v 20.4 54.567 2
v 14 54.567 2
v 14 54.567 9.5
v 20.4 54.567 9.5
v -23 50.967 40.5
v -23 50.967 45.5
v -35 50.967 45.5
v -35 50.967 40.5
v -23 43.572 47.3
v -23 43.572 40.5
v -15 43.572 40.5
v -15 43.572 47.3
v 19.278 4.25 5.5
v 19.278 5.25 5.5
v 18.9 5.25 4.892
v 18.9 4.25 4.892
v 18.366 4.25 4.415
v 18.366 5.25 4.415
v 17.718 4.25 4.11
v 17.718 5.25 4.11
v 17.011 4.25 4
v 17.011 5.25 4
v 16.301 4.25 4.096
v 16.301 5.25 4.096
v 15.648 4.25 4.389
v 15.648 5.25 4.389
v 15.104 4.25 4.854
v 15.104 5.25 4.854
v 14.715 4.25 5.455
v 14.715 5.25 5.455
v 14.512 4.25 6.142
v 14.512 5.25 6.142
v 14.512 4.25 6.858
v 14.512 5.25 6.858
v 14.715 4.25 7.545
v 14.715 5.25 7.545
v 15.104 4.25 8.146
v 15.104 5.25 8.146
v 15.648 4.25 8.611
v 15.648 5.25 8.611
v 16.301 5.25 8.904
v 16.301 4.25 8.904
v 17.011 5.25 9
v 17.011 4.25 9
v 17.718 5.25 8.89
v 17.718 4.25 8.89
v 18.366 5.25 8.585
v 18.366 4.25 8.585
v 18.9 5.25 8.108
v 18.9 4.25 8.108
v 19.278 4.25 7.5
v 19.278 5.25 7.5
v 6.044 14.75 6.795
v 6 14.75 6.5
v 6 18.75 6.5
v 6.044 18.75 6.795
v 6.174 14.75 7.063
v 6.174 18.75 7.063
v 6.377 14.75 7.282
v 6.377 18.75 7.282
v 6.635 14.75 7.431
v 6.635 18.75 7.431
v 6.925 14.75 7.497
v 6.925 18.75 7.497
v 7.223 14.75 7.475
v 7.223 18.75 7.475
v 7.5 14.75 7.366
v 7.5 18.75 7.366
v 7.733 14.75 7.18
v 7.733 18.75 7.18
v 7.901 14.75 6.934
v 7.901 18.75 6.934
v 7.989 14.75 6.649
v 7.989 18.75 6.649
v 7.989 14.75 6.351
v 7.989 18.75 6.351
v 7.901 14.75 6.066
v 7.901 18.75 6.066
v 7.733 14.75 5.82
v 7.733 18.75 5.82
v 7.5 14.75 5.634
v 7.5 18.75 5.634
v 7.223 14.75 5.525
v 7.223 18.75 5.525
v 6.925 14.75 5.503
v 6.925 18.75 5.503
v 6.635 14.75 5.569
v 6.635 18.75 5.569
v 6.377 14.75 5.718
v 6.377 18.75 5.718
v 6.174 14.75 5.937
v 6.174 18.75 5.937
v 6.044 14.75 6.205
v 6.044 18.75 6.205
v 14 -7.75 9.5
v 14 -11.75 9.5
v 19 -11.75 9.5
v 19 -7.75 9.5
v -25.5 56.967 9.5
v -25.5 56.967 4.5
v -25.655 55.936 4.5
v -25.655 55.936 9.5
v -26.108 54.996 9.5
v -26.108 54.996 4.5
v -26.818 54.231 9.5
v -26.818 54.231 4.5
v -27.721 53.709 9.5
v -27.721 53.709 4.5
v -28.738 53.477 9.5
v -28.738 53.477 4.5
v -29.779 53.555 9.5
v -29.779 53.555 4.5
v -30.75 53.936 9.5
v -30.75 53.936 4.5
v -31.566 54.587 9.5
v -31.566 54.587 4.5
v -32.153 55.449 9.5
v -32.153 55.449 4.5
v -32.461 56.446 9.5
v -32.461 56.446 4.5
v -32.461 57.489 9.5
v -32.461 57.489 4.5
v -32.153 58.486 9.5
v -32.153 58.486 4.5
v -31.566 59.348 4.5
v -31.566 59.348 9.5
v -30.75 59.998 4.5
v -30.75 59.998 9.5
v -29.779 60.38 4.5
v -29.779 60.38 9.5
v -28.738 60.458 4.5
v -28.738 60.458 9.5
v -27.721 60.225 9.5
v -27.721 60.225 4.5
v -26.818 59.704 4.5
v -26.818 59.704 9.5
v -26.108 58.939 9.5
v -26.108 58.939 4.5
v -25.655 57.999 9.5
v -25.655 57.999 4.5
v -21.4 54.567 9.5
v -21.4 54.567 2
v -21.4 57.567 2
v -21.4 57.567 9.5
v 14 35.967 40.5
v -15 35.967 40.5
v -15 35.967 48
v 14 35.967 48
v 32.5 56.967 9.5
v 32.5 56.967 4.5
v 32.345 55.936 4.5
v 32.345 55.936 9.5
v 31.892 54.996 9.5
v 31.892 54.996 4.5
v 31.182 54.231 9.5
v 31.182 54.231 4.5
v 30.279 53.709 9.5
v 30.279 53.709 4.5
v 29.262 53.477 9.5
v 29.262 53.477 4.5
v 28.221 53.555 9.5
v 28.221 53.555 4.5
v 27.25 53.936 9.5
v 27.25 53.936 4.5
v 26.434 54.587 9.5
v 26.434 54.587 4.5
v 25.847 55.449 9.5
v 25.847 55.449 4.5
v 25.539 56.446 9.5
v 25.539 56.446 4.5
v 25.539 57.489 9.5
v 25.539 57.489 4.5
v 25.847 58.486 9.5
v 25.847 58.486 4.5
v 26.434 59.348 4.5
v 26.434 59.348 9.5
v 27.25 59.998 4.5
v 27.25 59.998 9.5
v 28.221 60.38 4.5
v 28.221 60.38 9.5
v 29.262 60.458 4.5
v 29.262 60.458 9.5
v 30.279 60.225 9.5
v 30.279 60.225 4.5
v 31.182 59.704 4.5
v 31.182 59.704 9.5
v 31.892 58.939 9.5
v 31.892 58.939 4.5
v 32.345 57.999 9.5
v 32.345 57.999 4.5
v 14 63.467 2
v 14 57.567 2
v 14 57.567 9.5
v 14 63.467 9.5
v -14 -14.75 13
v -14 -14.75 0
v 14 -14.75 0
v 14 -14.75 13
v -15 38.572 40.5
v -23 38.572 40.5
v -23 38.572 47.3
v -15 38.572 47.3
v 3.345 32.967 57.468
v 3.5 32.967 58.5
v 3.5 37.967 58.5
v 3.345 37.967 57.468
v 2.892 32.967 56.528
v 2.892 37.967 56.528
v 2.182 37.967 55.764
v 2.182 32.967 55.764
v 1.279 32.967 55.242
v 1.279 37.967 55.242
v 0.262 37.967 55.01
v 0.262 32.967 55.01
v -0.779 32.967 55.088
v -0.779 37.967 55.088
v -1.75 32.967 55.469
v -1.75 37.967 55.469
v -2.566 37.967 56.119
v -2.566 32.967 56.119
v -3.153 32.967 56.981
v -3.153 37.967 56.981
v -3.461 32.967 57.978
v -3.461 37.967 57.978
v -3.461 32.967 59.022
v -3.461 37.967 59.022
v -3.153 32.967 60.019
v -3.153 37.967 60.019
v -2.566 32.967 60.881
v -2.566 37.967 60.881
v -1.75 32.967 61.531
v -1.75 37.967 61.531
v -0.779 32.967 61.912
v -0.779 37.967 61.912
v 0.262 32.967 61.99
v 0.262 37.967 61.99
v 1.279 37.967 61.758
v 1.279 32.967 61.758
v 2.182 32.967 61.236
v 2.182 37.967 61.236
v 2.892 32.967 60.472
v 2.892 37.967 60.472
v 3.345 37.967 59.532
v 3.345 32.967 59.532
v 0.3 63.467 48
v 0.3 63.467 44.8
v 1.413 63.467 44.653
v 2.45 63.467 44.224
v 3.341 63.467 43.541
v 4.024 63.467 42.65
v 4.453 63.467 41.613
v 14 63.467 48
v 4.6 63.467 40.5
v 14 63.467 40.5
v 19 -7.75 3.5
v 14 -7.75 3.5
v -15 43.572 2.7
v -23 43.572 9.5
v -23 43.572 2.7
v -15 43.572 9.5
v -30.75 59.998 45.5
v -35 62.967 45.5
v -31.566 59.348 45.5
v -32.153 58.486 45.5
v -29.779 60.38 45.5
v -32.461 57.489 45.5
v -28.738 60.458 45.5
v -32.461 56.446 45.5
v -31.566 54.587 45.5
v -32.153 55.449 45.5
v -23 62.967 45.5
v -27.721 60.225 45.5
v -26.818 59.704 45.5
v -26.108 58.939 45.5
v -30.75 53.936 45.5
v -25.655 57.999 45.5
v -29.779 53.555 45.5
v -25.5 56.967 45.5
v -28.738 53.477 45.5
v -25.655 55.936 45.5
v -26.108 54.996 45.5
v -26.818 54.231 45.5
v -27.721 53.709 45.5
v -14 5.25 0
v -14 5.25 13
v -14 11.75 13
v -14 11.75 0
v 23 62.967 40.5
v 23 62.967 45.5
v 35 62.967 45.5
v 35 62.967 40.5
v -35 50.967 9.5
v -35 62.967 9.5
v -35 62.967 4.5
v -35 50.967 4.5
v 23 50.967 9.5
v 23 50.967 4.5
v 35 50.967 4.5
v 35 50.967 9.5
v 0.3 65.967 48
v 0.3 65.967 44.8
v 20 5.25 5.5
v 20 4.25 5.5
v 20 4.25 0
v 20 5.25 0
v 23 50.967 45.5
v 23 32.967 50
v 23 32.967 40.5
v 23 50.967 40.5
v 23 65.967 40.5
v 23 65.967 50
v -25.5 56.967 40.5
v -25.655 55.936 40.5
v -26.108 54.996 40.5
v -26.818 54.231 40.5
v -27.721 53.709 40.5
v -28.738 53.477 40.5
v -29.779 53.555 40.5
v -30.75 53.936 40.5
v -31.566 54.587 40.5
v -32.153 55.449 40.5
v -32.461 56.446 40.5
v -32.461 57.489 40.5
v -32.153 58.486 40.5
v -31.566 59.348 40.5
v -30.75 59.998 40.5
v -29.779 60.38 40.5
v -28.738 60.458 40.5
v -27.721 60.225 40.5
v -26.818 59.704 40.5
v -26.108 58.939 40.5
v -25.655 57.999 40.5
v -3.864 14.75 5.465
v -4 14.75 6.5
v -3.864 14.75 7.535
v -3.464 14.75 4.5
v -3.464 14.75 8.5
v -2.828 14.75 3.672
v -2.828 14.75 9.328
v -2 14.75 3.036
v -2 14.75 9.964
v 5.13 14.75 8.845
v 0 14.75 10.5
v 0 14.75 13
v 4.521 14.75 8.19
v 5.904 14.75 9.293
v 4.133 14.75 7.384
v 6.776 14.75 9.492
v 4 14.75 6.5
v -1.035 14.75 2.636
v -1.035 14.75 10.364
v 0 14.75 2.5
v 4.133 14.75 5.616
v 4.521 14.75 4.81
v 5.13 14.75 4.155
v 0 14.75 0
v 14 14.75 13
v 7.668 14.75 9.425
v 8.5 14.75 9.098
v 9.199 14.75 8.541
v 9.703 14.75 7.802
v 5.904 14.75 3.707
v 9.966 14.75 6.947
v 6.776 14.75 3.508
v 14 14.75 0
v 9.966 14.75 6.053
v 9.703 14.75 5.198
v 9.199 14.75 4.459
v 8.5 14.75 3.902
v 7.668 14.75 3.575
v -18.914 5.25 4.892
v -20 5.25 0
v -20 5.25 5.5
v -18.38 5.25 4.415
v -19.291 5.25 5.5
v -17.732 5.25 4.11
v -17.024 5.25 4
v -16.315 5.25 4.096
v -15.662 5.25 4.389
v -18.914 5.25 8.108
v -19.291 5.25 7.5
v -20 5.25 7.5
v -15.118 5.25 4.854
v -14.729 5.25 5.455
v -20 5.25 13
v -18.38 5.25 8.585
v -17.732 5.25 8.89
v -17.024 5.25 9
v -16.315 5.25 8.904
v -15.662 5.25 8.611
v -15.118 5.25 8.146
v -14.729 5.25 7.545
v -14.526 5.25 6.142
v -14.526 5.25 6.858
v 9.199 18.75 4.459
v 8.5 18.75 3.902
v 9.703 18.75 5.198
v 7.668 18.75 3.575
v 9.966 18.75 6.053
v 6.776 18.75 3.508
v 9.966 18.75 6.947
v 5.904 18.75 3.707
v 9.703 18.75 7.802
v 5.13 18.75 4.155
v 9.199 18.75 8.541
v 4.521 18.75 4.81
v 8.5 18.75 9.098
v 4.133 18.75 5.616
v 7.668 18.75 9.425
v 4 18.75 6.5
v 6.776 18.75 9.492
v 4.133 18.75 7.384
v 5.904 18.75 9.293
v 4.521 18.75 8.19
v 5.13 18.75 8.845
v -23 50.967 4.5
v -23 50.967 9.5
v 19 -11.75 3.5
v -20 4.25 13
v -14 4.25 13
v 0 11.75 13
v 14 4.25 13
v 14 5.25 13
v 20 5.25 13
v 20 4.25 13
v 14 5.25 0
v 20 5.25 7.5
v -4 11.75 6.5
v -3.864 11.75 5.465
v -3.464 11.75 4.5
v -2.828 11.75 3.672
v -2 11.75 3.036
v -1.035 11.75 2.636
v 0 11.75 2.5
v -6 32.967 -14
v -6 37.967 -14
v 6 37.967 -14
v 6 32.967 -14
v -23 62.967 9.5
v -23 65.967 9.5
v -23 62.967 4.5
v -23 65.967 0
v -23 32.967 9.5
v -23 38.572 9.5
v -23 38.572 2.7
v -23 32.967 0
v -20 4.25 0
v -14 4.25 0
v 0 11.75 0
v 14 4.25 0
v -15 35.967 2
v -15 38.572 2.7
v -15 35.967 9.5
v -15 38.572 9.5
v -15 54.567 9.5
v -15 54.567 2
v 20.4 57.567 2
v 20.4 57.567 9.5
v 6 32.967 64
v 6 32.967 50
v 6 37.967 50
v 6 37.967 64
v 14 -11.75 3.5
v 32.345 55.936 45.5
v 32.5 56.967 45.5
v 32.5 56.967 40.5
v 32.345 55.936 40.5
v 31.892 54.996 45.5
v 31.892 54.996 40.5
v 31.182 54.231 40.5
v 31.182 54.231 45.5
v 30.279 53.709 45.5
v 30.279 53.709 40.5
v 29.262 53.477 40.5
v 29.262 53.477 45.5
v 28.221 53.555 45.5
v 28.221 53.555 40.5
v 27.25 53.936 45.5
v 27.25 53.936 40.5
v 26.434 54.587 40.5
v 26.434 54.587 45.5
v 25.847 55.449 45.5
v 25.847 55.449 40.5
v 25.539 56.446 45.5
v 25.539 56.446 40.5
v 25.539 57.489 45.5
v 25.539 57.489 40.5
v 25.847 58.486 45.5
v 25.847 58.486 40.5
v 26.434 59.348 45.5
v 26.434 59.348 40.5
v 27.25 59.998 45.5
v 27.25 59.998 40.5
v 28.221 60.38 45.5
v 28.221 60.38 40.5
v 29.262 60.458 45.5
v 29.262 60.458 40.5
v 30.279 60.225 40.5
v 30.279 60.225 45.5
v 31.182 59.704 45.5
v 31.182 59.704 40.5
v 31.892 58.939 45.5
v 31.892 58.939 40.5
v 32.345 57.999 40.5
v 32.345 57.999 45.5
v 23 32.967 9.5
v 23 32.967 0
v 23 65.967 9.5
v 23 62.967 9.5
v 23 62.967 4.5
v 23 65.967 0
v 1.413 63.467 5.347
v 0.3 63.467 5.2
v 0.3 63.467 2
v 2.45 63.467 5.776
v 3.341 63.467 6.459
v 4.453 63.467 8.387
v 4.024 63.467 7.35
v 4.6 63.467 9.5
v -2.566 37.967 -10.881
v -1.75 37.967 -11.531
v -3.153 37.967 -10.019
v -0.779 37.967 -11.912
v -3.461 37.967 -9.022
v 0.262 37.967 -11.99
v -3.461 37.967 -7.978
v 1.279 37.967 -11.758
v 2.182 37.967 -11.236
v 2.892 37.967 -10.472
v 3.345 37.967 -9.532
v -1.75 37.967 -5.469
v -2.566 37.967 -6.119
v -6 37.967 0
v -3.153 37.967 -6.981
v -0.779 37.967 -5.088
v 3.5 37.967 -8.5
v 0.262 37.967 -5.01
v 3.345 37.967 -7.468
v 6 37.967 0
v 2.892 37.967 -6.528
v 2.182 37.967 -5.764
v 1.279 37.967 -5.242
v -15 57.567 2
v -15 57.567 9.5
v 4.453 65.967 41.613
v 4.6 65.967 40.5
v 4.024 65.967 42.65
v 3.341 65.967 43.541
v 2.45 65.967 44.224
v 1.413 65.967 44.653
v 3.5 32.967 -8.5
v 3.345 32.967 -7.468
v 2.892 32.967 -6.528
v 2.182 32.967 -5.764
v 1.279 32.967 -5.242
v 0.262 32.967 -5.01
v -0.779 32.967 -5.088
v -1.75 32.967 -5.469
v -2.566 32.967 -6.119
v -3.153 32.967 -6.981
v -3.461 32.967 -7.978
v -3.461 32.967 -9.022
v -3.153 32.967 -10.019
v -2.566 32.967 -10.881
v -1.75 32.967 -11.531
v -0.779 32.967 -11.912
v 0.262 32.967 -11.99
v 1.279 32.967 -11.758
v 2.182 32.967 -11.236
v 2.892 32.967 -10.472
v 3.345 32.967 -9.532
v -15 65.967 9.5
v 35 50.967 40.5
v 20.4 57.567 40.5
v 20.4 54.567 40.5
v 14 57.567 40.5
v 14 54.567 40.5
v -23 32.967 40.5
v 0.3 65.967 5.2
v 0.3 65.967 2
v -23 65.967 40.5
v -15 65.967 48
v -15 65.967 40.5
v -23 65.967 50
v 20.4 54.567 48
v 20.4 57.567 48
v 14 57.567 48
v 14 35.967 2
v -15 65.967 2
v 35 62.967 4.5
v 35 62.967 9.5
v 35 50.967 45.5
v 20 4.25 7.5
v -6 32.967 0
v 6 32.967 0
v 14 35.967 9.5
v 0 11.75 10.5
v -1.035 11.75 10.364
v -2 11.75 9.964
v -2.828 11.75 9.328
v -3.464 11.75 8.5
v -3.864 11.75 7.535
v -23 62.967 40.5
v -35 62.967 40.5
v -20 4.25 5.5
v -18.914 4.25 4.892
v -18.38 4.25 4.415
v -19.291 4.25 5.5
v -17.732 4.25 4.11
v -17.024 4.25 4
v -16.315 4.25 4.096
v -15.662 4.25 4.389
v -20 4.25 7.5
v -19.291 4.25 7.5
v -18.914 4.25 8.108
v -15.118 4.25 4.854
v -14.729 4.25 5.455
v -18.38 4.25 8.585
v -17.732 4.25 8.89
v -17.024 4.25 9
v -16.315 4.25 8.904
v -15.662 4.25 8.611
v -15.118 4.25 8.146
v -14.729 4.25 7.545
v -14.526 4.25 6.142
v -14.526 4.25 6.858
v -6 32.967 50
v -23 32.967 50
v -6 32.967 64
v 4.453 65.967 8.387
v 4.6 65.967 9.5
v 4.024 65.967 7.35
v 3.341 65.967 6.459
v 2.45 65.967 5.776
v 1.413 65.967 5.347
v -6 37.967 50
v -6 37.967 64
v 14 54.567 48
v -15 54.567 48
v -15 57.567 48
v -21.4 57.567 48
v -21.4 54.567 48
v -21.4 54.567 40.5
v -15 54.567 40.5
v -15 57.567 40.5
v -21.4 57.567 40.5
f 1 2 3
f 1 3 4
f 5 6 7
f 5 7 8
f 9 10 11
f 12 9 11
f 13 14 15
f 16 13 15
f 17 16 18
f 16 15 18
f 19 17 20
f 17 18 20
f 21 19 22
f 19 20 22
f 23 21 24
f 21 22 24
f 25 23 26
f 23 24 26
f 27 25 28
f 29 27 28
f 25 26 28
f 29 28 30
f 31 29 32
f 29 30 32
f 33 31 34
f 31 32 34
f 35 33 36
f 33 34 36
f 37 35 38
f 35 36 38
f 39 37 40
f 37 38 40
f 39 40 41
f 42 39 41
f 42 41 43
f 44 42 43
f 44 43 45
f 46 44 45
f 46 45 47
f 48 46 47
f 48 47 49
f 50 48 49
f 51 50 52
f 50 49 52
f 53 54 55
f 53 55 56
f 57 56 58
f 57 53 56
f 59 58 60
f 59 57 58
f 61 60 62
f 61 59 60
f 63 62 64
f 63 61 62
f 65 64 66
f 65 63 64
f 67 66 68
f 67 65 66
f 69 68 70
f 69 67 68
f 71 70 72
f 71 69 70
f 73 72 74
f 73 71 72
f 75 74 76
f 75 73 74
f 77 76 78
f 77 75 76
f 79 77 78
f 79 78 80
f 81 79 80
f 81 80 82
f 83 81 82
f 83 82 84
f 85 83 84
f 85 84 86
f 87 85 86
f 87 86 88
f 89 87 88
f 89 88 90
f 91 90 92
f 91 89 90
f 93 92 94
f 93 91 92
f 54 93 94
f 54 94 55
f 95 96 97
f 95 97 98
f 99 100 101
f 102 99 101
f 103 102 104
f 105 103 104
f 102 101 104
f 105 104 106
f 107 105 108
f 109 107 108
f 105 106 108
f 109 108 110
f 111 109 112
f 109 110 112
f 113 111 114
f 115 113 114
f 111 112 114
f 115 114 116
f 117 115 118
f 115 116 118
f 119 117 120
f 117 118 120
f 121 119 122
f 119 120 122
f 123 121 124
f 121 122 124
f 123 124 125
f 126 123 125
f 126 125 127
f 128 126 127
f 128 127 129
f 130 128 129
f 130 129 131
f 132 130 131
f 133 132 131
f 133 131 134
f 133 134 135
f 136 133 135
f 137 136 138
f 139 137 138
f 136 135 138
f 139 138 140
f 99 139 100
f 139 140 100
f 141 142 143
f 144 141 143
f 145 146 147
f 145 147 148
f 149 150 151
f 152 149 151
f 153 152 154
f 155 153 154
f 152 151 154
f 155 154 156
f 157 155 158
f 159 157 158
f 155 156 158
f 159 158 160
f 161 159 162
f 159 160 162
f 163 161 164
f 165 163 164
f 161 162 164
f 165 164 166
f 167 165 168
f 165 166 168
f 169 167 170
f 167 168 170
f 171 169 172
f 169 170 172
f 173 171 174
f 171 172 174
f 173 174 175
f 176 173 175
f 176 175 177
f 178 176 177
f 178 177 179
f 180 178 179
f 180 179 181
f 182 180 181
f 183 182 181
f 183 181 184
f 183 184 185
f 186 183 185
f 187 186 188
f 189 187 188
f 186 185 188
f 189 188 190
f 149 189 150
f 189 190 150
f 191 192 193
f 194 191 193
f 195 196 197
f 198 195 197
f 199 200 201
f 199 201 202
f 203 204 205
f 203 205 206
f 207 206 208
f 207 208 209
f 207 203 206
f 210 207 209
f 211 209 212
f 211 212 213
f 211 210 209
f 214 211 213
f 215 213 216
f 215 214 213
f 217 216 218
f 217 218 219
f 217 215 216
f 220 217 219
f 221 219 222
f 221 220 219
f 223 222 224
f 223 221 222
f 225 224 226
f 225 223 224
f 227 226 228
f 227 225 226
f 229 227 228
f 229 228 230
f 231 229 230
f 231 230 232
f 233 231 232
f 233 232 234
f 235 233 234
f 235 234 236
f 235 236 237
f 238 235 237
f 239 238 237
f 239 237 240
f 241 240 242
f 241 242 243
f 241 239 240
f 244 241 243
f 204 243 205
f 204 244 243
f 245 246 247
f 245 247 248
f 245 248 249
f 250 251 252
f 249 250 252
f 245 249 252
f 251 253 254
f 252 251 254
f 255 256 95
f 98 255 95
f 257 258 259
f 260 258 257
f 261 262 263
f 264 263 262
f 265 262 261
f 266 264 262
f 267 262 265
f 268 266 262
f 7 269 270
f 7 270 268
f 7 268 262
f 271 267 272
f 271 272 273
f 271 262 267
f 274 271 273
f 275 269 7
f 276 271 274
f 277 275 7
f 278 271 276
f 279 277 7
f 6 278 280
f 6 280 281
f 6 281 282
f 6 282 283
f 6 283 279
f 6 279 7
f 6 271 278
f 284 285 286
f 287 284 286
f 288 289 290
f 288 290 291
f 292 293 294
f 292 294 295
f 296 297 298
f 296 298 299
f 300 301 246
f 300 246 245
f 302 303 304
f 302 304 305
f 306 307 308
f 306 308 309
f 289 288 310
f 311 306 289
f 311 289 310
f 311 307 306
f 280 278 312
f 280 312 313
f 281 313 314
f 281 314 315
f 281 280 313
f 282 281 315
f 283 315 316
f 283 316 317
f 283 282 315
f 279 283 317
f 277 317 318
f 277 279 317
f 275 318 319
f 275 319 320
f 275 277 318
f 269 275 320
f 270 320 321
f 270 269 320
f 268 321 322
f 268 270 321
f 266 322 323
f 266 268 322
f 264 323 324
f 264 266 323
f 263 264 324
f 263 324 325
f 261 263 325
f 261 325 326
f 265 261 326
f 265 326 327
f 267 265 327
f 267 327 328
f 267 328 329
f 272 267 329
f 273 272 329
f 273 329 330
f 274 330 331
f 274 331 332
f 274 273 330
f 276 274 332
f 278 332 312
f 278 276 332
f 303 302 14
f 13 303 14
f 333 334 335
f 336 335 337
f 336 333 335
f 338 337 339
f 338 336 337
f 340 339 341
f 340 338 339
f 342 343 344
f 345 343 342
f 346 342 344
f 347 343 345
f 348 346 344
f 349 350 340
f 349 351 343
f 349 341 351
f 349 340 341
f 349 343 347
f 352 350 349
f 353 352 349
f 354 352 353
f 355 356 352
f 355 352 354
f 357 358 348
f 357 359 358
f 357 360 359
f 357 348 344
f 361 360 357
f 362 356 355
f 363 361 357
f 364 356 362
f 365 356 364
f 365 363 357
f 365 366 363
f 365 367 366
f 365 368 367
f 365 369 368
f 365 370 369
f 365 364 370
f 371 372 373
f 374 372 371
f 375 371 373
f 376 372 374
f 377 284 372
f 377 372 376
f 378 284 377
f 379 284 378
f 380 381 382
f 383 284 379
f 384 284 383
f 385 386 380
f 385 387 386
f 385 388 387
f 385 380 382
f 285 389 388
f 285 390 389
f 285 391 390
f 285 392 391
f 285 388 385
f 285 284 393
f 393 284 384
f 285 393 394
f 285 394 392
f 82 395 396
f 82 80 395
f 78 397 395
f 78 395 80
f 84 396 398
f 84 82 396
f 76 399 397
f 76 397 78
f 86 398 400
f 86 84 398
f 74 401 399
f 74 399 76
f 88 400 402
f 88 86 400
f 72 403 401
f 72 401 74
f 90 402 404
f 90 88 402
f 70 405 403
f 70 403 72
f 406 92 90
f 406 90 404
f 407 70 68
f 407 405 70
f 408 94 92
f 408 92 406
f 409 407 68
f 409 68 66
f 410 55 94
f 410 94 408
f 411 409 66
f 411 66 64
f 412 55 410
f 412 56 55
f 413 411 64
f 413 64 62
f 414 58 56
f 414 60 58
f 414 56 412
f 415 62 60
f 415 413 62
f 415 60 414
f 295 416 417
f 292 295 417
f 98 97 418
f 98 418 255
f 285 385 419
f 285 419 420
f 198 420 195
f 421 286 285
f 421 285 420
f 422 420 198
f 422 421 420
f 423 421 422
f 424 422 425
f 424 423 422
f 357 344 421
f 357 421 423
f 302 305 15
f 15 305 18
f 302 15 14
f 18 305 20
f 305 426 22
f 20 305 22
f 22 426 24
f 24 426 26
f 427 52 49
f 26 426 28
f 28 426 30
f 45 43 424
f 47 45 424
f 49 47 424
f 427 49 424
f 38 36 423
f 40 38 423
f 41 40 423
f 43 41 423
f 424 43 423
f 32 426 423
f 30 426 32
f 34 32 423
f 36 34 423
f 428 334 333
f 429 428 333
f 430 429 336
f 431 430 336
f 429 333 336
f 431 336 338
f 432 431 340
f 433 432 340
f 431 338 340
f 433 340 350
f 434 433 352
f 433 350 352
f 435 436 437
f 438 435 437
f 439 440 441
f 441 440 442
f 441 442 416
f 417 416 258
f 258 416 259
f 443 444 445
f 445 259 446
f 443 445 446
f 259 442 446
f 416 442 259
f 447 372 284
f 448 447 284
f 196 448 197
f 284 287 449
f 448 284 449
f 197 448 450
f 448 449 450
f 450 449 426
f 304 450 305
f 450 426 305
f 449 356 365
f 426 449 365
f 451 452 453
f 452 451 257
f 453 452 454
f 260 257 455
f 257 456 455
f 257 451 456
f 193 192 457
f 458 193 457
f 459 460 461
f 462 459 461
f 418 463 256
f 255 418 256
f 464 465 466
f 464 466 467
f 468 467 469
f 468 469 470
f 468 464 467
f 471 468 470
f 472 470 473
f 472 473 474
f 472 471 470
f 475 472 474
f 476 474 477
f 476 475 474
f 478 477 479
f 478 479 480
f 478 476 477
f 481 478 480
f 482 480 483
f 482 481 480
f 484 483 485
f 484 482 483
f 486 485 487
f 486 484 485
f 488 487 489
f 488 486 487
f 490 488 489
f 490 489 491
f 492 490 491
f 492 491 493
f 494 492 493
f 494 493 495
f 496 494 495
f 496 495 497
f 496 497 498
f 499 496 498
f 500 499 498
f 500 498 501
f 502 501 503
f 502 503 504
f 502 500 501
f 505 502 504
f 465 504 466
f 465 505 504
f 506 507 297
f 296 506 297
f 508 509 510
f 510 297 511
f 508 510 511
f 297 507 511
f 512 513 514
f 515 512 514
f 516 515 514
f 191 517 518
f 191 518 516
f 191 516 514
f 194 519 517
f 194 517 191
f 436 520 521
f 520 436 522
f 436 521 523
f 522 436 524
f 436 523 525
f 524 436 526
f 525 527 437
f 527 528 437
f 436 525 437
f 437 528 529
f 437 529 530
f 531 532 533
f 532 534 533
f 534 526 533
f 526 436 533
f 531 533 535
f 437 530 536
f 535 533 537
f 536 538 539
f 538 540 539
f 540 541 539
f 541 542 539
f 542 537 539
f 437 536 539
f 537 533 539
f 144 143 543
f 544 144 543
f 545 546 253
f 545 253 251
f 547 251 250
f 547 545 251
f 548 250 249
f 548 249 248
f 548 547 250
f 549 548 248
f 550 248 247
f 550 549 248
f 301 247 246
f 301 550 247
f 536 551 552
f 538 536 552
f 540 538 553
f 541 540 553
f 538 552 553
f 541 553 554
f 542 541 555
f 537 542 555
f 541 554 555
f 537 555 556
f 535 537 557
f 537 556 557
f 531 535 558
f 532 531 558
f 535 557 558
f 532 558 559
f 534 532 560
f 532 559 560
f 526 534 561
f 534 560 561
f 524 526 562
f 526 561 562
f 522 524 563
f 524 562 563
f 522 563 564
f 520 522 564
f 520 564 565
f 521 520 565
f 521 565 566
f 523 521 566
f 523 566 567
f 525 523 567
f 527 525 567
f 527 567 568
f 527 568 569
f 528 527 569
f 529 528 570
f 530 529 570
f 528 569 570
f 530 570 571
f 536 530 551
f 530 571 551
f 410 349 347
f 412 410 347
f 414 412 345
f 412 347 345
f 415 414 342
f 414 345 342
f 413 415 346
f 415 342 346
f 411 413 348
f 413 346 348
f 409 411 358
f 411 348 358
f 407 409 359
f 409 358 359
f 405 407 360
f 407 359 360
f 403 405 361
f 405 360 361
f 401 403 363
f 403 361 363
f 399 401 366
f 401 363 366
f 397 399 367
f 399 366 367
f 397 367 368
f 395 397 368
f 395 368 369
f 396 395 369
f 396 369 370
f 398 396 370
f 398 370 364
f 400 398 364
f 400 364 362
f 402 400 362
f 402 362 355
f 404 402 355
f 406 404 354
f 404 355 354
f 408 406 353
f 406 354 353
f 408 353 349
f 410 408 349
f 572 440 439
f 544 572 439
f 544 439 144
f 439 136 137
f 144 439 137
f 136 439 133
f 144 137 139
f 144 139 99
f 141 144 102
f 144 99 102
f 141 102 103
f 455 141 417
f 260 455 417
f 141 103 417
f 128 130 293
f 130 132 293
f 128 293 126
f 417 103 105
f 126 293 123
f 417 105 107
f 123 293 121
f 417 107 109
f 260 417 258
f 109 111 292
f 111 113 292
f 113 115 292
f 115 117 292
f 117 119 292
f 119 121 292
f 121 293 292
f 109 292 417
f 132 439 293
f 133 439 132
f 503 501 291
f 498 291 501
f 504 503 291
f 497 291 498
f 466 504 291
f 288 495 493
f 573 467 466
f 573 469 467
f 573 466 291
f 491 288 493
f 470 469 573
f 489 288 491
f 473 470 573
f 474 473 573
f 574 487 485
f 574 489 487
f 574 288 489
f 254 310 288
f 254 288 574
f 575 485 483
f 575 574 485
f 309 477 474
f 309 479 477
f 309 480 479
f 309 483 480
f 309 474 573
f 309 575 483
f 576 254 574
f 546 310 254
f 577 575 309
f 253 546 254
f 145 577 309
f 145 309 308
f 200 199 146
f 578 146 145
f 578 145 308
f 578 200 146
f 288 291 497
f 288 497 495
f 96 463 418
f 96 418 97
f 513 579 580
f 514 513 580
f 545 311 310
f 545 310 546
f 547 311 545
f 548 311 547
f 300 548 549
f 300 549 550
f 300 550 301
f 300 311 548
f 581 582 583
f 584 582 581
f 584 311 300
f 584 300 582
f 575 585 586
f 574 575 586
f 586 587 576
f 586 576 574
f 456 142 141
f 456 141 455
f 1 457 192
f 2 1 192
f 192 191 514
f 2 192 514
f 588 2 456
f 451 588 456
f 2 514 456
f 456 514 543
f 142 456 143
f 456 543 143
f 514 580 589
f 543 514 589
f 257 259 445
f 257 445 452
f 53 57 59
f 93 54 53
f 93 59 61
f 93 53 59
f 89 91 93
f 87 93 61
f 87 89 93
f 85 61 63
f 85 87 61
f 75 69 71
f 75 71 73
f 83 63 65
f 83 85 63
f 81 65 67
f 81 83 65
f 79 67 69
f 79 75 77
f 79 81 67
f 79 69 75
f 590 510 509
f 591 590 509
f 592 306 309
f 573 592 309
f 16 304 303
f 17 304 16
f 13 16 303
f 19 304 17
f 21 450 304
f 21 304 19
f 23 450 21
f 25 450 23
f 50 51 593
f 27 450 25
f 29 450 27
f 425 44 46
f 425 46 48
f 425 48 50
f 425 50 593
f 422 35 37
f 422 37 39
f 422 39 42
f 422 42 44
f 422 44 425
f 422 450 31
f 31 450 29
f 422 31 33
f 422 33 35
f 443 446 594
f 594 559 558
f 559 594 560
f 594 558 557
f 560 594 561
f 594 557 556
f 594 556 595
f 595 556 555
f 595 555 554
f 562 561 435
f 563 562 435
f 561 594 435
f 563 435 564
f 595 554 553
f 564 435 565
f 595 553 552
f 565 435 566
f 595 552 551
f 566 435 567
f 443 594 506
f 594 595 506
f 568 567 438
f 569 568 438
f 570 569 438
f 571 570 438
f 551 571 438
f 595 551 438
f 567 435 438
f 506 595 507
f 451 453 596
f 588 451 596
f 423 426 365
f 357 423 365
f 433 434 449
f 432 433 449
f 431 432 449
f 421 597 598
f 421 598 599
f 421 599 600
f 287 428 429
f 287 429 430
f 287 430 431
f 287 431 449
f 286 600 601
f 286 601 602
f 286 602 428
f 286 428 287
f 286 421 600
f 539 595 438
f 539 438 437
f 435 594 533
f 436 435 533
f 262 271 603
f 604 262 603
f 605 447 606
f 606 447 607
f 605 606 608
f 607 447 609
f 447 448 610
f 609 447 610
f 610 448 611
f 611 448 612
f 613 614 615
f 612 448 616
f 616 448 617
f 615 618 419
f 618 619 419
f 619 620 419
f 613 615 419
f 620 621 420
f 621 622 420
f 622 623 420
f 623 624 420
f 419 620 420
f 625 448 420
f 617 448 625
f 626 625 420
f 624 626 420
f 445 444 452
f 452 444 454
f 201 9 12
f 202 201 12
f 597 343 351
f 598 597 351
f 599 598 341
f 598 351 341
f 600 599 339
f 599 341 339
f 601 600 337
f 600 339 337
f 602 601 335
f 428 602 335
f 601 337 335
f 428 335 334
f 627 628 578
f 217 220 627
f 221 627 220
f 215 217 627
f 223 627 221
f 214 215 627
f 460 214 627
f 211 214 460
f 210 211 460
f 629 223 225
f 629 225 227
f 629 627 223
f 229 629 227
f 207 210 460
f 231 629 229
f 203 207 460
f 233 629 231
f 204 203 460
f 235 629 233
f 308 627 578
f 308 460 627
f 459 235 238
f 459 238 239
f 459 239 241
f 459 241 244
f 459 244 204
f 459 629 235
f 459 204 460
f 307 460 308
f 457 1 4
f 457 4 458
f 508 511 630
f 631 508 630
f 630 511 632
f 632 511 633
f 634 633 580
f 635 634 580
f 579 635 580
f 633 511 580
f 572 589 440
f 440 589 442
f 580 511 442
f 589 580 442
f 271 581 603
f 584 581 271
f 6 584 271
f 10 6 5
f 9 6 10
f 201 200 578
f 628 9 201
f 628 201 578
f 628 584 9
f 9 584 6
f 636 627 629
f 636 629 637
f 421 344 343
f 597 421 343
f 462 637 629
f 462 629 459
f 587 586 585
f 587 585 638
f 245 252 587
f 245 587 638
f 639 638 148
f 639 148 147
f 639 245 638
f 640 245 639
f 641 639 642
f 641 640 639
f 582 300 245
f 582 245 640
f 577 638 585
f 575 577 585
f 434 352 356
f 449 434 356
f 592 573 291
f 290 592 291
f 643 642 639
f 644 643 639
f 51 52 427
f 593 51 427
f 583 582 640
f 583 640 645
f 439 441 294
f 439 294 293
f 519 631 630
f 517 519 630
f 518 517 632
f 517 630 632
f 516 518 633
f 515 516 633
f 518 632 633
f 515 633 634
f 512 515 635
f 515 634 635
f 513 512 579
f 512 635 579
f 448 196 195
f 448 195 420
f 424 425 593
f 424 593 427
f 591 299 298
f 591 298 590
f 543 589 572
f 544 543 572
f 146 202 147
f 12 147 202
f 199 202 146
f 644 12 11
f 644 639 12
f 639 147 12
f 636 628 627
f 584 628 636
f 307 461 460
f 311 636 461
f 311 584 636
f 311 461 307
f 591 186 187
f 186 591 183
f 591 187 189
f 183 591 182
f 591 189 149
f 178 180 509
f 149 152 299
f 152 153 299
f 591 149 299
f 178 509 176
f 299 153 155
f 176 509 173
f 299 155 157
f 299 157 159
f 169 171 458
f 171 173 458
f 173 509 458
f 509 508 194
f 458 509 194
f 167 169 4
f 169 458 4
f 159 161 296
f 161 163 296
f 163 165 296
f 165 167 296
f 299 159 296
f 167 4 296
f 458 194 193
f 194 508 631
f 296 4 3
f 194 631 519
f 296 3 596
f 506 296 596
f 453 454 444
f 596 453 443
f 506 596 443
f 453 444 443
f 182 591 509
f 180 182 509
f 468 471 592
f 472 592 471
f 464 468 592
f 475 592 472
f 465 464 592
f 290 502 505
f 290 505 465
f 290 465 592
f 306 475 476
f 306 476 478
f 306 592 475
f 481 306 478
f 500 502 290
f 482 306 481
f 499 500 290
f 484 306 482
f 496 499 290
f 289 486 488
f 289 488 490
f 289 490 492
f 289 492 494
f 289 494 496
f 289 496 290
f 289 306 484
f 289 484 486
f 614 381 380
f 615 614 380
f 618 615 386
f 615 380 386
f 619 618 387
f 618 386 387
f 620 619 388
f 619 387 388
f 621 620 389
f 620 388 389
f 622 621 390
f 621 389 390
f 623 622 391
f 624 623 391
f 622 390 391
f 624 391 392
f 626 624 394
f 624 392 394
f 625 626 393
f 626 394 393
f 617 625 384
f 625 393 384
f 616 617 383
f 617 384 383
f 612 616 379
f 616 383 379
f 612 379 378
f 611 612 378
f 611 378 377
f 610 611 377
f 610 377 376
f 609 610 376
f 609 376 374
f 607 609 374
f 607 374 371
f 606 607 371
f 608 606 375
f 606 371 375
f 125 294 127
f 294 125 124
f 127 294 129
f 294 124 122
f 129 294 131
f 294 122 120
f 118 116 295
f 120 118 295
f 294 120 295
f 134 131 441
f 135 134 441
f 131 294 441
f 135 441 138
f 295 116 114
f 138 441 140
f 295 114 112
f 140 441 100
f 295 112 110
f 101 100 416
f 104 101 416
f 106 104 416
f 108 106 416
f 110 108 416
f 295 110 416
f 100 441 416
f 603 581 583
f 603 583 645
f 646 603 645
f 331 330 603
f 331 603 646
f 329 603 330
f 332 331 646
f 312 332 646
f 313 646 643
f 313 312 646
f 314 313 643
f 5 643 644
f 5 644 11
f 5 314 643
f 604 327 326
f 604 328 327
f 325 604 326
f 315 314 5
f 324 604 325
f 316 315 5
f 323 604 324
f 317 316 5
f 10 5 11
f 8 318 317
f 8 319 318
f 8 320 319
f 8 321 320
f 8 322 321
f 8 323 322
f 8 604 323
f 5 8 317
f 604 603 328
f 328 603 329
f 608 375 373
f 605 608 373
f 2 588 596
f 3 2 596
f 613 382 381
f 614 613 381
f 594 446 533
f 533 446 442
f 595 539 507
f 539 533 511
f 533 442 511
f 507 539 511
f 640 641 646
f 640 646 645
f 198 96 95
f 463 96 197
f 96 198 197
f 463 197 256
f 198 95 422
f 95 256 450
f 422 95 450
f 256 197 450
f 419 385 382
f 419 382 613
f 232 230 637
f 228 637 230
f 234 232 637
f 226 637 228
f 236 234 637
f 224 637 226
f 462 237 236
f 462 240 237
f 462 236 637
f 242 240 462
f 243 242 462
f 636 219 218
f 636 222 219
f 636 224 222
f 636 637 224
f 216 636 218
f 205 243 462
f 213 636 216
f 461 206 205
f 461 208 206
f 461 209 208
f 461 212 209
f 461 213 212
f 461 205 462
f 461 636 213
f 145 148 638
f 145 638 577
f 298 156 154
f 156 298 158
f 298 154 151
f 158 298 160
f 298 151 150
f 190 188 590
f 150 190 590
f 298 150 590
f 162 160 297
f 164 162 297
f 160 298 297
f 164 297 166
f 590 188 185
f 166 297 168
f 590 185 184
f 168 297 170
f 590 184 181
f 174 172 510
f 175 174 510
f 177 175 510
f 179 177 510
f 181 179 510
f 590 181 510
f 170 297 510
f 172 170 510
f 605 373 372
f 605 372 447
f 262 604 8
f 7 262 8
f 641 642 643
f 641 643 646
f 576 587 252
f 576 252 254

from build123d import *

# Parameters (mm, degrees)
F0_W      = 28
F0_H      = 29.5
F1_DEPTH  = 13
F3_DEPTH  = 3
F4_R      = 3
F4_R_2    = 1
F5_DEPTH  = 4
F6_W      = 1
F6_H      = 13
F7_DEPTH  = 6
F8_W      = 1
F8_H      = 13
F9_DEPTH  = 6
F11_DEPTH = 1
F13_DEPTH = 1
F14_W     = 4
F14_H     = 6
F15_DEPTH = 5
F16_W     = 12
F16_H     = 5
F17_DEPTH = 19
F19_W     = 29
F19_H     = 14
F20_DEPTH = 26.5
F21_W     = 33
F21_H     = 9.5
F22_DEPTH = 46
F24_DEPTH = 4
F25_W     = 6.4
F25_H     = 3
F26_DEPTH = 7.5
F27_W     = 9
F27_H     = 5
F28_DEPTH = 6.8
F31_W     = 12
F31_H     = 5
F32_DEPTH = 12
F33_W     = 12
F33_H     = 5
F34_DEPTH = 12
F35_R     = 3.5
F36_DEPTH = 5
F37_R     = 3.5
F38_DEPTH = 5
F39_DEPTH = 1
F40_DEPTH = 14
F41_R     = 3.5
F42_DEPTH = 5


# Not quite as in the source:
# - a feature names something its author has since deleted; it is built from what else it names


with BuildPart() as f1:
    # F0 (on Top) → F1 (new body)
    with BuildSketch(Plane.XY):
        Rectangle(F0_W, F0_H)
    extrude(amount=F1_DEPTH)

    # F2 (on face) → F3 (cut)
    with BuildSketch(Plane(origin=(0, 14.75, 0), x_dir=(-1, 0, 0), z_dir=(0, 1, 0))):
        with BuildLine():
            ThreePointArc((0, 10.5), (2.8284271247, 9.3284271247), (4, 6.5))
            ThreePointArc((4, 6.5), (2.8284271247, 3.6715728753), (0, 2.5))
            Line((0, 2.5), (0, 0))
            Line((0, 0), (14, 0))
            Line((14, 0), (14, 13))
            Line((14, 13), (0, 13))
            Line((0, 13), (0, 10.5))
        make_face()
    extrude(amount=-F3_DEPTH, mode=Mode.SUBTRACT)

    # F4 (on face) → F5 (join)
    with BuildSketch(Plane(origin=(0, 14.75, 0), x_dir=(-1, 0, 0), z_dir=(0, 1, 0))):
        with Locations((-7, 6.5)):
            Circle(F4_R)
        with Locations((-7, 6.5)):
            Circle(F4_R_2, mode=Mode.SUBTRACT)
    extrude(amount=F5_DEPTH)

    # F6 (on face) → F7 (join)
    with BuildSketch(Plane(origin=(-14, 0, 0), x_dir=(0, -1, 0), z_dir=(-1, 0, 0))):
        with Locations((-4.75, 6.5)):
            Rectangle(F6_W, F6_H)
    extrude(amount=F7_DEPTH)

    # F8 (on face) → F9 (join)
    with BuildSketch(Plane.YZ.offset(14)):
        with Locations((4.75, 6.5)):
            Rectangle(F8_W, F8_H)
    extrude(amount=F9_DEPTH)

    # F10 (on face) → F11 (cut)
    with BuildSketch(Plane(origin=(0, 5.25, 0), x_dir=(-1, 0, 0), z_dir=(0, 1, 0))):
        with BuildLine():
            Line((-20, 5.5), (-19.2775895342, 5.5))
            ThreePointArc((-19.2775895342, 5.5), (-14.4863016867, 6.5), (-19.2775895342, 7.5))
            Line((-19.2775895342, 7.5), (-20, 7.5))
            Line((-20, 7.5), (-20, 5.5))
        make_face()
    extrude(amount=-F11_DEPTH, mode=Mode.SUBTRACT)

    # F12 (on face) → F13 (cut)
    with BuildSketch(Plane(origin=(0, 5.25, 0), x_dir=(-1, 0, 0), z_dir=(0, 1, 0))):
        with BuildLine():
            Line((20, 7.5), (19.2912878475, 7.5))
            ThreePointArc((19.2912878475, 7.5), (14.5, 6.5), (19.2912878475, 5.5))
            Line((19.2912878475, 5.5), (20, 5.5))
            Line((20, 5.5), (20, 7.5))
        make_face()
    extrude(amount=-F13_DEPTH, mode=Mode.SUBTRACT)

    # F14 (on face) → F15 (join)
    with BuildSketch(Plane.YZ.offset(14)):
        with Locations((-9.75, 6.5)):
            Rectangle(F14_W, F14_H)
    extrude(amount=F15_DEPTH)


with BuildPart() as f17:
    # F16 (on Top) → F17 (new body)
    with BuildSketch(Plane.XY):
        Polygon((23, 65.9673700035), (-23, 65.9673700035), (-23, 32.9673700035), (-6, 32.9673700035), (-6, 37.9673700035), (6, 37.9673700035), (6, 32.9673700035), (23, 32.9673700035), align=None)
        with Locations((0, 35.4673700035)):
            Rectangle(F16_W, F16_H)
    extrude(amount=F17_DEPTH)

    # F19 (on offset) → F20 (cut)
    with BuildSketch(Plane.XZ.offset(-35.9673700035)):
        with Locations((-0.5, 9)):
            Rectangle(F19_W, F19_H)
    extrude(amount=-F20_DEPTH, mode=Mode.SUBTRACT)

    # F21 (on face) → F22 (cut)
    with BuildSketch(Plane(origin=(-23, 0, 0), x_dir=(0, -1, 0), z_dir=(-1, 0, 0))):
        with Locations((-49.4673700035, 14.25)):
            Rectangle(F21_W, F21_H)
    extrude(amount=-F22_DEPTH, mode=Mode.SUBTRACT)

    # F23 (on face) → F24 (cut)
    with BuildSketch(Plane(origin=(0, 65.9673700035, 0), x_dir=(-1, 0, 0), z_dir=(0, 1, 0))):
        with BuildLine():
            Line((4, 9.5), (-4.6, 9.5))
            ThreePointArc((-4.6, 9.5), (-3.3405591591, 6.4594408409), (-0.3, 5.2))
            Line((-0.3, 5.2), (-0.3, 2))
            Line((-0.3, 2), (15, 2))
            Line((15, 2), (15, 9.5))
            Line((15, 9.5), (4, 9.5))
        make_face()
    extrude(amount=-F24_DEPTH, mode=Mode.SUBTRACT)

    # F25 (on face) → F26 (cut)
    with BuildSketch(Plane.XY.offset(9.5)):
        with Locations((-18.2, 56.0673700035)):
            Rectangle(F25_W, F25_H)
        with Locations((17.2, 56.0673700035)):
            Rectangle(F25_W, F25_H)
    extrude(amount=-F26_DEPTH, mode=Mode.SUBTRACT)

    # F27 (on face) → F28 (cut)
    with BuildSketch(Plane.XY.offset(9.5)):
        with Locations((-19.5, 41.0718345642)):
            Rectangle(F27_W, F27_H)
    extrude(amount=-F28_DEPTH, mode=Mode.SUBTRACT)


with BuildPart() as f30_1:
    # F30: copy of F17
    add(f17.part)


with BuildPart() as f17_1:
    add(f17.part)

    add(f30_1.part)  # F32 merges F30_1
    # F31 (on face) → F32 (join)
    with BuildSketch(Plane.YZ.offset(23)):
        with Locations((56.9673700035, 7)):
            Rectangle(F31_W, F31_H)
    extrude(amount=F32_DEPTH)

    # F33 (on face) → F34 (join)
    with BuildSketch(Plane(origin=(-23, 0, 0), x_dir=(0, -1, 0), z_dir=(-1, 0, 0))):
        with Locations((-56.9673700035, 7)):
            Rectangle(F33_W, F33_H)
    extrude(amount=F34_DEPTH)

    # F35 (on face) → F36 (cut)
    with BuildSketch(Plane(origin=(0, 0, 4.5), x_dir=(1, 0, 0), z_dir=(0, 0, -1))):
        with Locations((-29, -56.9673700035)):
            Circle(F35_R)
    extrude(amount=-F36_DEPTH, mode=Mode.SUBTRACT)

    # F37 (on face) → F38 (cut)
    with BuildSketch(Plane(origin=(0, 0, 4.5), x_dir=(1, 0, 0), z_dir=(0, 0, -1))):
        with Locations((29, -56.9673700035)):
            Circle(F37_R)
    extrude(amount=-F38_DEPTH, mode=Mode.SUBTRACT)

    # F39 (cut): a face of the model
    f39_faces = [f17_1.faces().sort_by_distance(p)[0] for p in [
        (7.9771009102, 62.4673700035, 5.4331480297),
    ]]
    extrude(f39_faces, amount=-F39_DEPTH, mode=Mode.SUBTRACT)

    # F16 (on Top) → F40 (join)
    with BuildSketch(Plane.XY):
        with Locations((0, 35.4673700035)):
            Rectangle(F16_W, F16_H)
    extrude(amount=-F40_DEPTH)

    # F41 (on face) → F42 (cut)
    with BuildSketch(Plane.XZ.offset(-32.9673700035)):
        with Locations((0, -8.5)):
            Circle(F41_R)
    extrude(amount=-F42_DEPTH, mode=Mode.SUBTRACT)


with BuildPart() as f43_1:
    # F43: instance of F17
    add(f17_1.part.mirror(Plane.XY.offset(25)))


solid = Compound([f1.part, f17_1.part, f43_1.part])
